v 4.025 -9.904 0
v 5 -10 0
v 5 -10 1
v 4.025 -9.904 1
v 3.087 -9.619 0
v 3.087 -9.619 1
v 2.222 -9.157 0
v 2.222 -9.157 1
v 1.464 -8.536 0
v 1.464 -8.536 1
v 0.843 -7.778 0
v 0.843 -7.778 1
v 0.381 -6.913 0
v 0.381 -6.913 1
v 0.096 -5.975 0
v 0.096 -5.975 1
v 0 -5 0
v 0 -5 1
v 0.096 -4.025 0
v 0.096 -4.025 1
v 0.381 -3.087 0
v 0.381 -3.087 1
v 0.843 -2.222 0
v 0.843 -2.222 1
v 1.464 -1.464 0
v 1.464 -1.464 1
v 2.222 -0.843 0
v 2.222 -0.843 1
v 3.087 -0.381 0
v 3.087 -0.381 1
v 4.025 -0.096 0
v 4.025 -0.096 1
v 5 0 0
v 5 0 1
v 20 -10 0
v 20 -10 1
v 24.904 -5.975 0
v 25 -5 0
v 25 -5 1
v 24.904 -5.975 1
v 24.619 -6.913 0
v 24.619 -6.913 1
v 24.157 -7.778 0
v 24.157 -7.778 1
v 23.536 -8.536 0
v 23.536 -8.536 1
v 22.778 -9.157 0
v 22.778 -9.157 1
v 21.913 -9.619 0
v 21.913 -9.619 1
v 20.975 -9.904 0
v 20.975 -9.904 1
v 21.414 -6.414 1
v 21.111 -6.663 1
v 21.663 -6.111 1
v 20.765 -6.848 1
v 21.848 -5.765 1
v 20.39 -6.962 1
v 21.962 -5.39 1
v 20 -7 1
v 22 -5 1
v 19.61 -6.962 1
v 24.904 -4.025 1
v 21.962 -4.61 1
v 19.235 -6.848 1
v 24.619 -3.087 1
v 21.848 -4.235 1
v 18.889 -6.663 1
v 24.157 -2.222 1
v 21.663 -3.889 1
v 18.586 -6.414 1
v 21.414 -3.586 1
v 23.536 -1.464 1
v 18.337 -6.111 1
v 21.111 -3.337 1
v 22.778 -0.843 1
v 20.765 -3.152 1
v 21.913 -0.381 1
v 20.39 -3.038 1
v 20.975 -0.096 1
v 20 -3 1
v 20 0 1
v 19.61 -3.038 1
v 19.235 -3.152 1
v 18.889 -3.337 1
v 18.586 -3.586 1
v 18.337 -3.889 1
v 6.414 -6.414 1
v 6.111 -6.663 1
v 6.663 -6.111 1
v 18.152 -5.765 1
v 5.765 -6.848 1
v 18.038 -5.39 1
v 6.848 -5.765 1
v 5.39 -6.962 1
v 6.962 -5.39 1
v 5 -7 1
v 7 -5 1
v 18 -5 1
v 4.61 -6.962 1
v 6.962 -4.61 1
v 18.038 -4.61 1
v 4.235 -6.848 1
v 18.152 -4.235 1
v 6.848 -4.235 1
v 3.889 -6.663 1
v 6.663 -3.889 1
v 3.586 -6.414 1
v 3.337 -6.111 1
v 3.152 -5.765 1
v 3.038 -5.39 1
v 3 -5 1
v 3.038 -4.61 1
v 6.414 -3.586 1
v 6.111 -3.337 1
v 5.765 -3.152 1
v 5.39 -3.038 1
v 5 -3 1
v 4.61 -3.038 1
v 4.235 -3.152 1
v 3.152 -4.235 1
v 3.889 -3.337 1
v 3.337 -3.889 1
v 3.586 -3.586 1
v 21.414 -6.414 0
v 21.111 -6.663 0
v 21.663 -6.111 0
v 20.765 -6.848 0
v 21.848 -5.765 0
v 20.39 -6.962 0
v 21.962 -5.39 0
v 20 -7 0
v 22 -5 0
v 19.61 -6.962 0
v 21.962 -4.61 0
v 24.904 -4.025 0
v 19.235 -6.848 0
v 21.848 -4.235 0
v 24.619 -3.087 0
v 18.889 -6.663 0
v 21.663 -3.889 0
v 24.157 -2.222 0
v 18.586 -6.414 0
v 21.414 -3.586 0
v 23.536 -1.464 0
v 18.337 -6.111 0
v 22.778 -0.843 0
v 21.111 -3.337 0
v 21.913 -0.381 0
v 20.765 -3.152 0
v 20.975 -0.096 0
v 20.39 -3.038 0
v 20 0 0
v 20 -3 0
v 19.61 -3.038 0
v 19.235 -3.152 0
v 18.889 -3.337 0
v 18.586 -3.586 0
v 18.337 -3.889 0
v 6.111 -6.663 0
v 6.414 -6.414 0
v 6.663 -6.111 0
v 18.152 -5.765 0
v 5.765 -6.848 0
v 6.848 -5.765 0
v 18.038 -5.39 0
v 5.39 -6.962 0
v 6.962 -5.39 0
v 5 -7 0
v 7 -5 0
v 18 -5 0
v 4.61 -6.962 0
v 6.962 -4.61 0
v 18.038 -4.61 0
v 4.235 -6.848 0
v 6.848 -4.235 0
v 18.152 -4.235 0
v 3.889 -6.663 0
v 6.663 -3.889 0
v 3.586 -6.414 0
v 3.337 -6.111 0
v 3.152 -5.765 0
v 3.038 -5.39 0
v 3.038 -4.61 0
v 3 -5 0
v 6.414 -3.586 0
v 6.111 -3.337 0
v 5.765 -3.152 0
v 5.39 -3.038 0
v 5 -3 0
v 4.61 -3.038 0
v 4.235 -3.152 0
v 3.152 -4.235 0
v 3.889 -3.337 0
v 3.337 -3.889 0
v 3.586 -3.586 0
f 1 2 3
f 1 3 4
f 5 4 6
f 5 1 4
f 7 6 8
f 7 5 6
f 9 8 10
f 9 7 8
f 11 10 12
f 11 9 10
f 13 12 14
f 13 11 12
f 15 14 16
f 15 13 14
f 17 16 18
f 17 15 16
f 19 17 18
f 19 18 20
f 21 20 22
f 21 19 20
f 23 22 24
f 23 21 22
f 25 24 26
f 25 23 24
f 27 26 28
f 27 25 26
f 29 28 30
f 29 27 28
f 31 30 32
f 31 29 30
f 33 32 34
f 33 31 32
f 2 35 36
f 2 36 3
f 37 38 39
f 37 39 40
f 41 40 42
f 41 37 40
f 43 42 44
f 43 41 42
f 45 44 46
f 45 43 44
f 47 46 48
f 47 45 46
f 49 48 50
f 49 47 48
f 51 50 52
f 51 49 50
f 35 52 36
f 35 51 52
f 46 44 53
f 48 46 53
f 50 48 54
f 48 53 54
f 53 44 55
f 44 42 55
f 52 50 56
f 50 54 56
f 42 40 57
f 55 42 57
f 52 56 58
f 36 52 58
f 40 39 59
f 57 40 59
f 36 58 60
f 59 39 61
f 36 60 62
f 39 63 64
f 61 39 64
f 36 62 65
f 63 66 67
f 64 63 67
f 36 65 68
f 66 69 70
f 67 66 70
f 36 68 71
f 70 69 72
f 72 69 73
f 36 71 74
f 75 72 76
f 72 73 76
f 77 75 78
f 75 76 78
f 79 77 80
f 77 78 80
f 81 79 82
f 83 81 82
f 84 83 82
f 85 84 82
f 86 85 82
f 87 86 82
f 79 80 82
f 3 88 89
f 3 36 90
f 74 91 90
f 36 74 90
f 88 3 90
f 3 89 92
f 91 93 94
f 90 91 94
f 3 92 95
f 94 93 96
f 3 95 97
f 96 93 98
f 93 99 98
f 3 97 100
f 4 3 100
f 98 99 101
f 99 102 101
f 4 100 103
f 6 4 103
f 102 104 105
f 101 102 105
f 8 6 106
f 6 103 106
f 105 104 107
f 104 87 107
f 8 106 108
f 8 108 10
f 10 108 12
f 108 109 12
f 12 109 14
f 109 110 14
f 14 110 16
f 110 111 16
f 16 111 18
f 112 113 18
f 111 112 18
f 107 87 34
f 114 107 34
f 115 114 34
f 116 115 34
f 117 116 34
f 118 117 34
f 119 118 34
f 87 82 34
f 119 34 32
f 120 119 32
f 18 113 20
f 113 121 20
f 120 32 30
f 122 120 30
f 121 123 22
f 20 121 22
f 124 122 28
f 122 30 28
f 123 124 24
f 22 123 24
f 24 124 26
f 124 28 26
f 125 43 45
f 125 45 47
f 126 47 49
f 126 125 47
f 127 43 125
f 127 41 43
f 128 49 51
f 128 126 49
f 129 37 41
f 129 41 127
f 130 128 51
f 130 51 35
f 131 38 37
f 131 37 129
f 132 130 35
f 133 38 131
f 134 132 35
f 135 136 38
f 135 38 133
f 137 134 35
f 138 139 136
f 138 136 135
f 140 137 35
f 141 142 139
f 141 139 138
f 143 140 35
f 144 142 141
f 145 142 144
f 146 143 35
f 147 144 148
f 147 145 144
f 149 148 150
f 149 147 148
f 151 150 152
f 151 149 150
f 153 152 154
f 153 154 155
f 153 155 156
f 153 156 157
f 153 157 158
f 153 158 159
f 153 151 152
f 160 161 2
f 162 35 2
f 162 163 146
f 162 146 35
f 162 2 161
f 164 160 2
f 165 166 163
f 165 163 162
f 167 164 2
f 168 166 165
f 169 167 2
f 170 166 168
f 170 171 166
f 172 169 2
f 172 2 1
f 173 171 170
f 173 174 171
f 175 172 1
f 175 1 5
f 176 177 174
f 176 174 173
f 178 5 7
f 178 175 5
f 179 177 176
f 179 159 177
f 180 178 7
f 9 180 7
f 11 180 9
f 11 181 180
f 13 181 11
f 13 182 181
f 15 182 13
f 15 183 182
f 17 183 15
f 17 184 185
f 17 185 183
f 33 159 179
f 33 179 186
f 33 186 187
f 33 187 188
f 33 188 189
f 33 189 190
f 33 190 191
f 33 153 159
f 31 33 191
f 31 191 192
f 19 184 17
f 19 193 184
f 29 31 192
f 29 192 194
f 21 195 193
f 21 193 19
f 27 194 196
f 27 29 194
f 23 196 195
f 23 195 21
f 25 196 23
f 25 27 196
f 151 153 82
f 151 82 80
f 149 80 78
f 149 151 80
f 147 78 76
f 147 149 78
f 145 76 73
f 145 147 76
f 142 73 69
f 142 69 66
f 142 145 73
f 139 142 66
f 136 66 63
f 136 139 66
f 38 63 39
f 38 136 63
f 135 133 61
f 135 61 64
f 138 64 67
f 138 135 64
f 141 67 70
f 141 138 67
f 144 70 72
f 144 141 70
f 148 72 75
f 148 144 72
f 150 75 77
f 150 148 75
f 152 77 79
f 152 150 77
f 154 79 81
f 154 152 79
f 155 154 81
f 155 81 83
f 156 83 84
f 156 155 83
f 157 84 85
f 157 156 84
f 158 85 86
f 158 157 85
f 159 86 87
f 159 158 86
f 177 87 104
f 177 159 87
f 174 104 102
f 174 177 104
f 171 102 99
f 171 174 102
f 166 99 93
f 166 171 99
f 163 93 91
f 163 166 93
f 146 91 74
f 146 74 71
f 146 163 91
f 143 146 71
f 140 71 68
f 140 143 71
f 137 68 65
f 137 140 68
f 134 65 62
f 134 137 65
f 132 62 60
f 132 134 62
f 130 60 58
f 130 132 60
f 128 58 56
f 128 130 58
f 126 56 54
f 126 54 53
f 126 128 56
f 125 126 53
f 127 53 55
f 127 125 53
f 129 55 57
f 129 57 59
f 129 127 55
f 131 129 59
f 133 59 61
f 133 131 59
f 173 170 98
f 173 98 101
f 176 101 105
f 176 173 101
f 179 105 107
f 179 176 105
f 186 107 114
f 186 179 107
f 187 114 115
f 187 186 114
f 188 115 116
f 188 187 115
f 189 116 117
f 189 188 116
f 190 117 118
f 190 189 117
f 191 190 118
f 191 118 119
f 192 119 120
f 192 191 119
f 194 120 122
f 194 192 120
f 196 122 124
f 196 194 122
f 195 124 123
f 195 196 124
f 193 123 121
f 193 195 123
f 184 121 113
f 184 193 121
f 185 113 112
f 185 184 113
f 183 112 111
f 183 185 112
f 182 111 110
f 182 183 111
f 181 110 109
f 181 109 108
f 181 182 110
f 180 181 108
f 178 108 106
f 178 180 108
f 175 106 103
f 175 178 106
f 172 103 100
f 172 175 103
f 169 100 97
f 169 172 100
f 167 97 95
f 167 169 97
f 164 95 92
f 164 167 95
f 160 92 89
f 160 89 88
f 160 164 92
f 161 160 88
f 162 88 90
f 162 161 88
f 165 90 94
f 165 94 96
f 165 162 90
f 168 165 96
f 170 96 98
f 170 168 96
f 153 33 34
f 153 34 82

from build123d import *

# Parameters (mm, degrees)
SKETCH_1_R      = 2
EXTRUDE_1_DEPTH = 1


with BuildPart() as part:
    # Эскиз1 → Бобышка-Вытянуть1 (new body)
    with BuildSketch(Plane.XY):
        with BuildLine():
            Line((5, 0), (20, 0))
            ThreePointArc((20, 0), (23.535533906, -1.464466094), (25, -5))
            ThreePointArc((25, -5), (23.535533906, -8.535533906), (20, -10))
            Line((20, -10), (5, -10))
            ThreePointArc((5, -10), (1.464466094, -8.535533906), (0, -5))
            ThreePointArc((0, -5), (1.464466094, -1.464466094), (5, 0))
        make_face()
        with Locations((5, -5)):
            Circle(SKETCH_1_R, mode=Mode.SUBTRACT)
        with Locations((20, -5)):
            Circle(SKETCH_1_R, mode=Mode.SUBTRACT)
    extrude(amount=EXTRUDE_1_DEPTH)


solid = part.part
